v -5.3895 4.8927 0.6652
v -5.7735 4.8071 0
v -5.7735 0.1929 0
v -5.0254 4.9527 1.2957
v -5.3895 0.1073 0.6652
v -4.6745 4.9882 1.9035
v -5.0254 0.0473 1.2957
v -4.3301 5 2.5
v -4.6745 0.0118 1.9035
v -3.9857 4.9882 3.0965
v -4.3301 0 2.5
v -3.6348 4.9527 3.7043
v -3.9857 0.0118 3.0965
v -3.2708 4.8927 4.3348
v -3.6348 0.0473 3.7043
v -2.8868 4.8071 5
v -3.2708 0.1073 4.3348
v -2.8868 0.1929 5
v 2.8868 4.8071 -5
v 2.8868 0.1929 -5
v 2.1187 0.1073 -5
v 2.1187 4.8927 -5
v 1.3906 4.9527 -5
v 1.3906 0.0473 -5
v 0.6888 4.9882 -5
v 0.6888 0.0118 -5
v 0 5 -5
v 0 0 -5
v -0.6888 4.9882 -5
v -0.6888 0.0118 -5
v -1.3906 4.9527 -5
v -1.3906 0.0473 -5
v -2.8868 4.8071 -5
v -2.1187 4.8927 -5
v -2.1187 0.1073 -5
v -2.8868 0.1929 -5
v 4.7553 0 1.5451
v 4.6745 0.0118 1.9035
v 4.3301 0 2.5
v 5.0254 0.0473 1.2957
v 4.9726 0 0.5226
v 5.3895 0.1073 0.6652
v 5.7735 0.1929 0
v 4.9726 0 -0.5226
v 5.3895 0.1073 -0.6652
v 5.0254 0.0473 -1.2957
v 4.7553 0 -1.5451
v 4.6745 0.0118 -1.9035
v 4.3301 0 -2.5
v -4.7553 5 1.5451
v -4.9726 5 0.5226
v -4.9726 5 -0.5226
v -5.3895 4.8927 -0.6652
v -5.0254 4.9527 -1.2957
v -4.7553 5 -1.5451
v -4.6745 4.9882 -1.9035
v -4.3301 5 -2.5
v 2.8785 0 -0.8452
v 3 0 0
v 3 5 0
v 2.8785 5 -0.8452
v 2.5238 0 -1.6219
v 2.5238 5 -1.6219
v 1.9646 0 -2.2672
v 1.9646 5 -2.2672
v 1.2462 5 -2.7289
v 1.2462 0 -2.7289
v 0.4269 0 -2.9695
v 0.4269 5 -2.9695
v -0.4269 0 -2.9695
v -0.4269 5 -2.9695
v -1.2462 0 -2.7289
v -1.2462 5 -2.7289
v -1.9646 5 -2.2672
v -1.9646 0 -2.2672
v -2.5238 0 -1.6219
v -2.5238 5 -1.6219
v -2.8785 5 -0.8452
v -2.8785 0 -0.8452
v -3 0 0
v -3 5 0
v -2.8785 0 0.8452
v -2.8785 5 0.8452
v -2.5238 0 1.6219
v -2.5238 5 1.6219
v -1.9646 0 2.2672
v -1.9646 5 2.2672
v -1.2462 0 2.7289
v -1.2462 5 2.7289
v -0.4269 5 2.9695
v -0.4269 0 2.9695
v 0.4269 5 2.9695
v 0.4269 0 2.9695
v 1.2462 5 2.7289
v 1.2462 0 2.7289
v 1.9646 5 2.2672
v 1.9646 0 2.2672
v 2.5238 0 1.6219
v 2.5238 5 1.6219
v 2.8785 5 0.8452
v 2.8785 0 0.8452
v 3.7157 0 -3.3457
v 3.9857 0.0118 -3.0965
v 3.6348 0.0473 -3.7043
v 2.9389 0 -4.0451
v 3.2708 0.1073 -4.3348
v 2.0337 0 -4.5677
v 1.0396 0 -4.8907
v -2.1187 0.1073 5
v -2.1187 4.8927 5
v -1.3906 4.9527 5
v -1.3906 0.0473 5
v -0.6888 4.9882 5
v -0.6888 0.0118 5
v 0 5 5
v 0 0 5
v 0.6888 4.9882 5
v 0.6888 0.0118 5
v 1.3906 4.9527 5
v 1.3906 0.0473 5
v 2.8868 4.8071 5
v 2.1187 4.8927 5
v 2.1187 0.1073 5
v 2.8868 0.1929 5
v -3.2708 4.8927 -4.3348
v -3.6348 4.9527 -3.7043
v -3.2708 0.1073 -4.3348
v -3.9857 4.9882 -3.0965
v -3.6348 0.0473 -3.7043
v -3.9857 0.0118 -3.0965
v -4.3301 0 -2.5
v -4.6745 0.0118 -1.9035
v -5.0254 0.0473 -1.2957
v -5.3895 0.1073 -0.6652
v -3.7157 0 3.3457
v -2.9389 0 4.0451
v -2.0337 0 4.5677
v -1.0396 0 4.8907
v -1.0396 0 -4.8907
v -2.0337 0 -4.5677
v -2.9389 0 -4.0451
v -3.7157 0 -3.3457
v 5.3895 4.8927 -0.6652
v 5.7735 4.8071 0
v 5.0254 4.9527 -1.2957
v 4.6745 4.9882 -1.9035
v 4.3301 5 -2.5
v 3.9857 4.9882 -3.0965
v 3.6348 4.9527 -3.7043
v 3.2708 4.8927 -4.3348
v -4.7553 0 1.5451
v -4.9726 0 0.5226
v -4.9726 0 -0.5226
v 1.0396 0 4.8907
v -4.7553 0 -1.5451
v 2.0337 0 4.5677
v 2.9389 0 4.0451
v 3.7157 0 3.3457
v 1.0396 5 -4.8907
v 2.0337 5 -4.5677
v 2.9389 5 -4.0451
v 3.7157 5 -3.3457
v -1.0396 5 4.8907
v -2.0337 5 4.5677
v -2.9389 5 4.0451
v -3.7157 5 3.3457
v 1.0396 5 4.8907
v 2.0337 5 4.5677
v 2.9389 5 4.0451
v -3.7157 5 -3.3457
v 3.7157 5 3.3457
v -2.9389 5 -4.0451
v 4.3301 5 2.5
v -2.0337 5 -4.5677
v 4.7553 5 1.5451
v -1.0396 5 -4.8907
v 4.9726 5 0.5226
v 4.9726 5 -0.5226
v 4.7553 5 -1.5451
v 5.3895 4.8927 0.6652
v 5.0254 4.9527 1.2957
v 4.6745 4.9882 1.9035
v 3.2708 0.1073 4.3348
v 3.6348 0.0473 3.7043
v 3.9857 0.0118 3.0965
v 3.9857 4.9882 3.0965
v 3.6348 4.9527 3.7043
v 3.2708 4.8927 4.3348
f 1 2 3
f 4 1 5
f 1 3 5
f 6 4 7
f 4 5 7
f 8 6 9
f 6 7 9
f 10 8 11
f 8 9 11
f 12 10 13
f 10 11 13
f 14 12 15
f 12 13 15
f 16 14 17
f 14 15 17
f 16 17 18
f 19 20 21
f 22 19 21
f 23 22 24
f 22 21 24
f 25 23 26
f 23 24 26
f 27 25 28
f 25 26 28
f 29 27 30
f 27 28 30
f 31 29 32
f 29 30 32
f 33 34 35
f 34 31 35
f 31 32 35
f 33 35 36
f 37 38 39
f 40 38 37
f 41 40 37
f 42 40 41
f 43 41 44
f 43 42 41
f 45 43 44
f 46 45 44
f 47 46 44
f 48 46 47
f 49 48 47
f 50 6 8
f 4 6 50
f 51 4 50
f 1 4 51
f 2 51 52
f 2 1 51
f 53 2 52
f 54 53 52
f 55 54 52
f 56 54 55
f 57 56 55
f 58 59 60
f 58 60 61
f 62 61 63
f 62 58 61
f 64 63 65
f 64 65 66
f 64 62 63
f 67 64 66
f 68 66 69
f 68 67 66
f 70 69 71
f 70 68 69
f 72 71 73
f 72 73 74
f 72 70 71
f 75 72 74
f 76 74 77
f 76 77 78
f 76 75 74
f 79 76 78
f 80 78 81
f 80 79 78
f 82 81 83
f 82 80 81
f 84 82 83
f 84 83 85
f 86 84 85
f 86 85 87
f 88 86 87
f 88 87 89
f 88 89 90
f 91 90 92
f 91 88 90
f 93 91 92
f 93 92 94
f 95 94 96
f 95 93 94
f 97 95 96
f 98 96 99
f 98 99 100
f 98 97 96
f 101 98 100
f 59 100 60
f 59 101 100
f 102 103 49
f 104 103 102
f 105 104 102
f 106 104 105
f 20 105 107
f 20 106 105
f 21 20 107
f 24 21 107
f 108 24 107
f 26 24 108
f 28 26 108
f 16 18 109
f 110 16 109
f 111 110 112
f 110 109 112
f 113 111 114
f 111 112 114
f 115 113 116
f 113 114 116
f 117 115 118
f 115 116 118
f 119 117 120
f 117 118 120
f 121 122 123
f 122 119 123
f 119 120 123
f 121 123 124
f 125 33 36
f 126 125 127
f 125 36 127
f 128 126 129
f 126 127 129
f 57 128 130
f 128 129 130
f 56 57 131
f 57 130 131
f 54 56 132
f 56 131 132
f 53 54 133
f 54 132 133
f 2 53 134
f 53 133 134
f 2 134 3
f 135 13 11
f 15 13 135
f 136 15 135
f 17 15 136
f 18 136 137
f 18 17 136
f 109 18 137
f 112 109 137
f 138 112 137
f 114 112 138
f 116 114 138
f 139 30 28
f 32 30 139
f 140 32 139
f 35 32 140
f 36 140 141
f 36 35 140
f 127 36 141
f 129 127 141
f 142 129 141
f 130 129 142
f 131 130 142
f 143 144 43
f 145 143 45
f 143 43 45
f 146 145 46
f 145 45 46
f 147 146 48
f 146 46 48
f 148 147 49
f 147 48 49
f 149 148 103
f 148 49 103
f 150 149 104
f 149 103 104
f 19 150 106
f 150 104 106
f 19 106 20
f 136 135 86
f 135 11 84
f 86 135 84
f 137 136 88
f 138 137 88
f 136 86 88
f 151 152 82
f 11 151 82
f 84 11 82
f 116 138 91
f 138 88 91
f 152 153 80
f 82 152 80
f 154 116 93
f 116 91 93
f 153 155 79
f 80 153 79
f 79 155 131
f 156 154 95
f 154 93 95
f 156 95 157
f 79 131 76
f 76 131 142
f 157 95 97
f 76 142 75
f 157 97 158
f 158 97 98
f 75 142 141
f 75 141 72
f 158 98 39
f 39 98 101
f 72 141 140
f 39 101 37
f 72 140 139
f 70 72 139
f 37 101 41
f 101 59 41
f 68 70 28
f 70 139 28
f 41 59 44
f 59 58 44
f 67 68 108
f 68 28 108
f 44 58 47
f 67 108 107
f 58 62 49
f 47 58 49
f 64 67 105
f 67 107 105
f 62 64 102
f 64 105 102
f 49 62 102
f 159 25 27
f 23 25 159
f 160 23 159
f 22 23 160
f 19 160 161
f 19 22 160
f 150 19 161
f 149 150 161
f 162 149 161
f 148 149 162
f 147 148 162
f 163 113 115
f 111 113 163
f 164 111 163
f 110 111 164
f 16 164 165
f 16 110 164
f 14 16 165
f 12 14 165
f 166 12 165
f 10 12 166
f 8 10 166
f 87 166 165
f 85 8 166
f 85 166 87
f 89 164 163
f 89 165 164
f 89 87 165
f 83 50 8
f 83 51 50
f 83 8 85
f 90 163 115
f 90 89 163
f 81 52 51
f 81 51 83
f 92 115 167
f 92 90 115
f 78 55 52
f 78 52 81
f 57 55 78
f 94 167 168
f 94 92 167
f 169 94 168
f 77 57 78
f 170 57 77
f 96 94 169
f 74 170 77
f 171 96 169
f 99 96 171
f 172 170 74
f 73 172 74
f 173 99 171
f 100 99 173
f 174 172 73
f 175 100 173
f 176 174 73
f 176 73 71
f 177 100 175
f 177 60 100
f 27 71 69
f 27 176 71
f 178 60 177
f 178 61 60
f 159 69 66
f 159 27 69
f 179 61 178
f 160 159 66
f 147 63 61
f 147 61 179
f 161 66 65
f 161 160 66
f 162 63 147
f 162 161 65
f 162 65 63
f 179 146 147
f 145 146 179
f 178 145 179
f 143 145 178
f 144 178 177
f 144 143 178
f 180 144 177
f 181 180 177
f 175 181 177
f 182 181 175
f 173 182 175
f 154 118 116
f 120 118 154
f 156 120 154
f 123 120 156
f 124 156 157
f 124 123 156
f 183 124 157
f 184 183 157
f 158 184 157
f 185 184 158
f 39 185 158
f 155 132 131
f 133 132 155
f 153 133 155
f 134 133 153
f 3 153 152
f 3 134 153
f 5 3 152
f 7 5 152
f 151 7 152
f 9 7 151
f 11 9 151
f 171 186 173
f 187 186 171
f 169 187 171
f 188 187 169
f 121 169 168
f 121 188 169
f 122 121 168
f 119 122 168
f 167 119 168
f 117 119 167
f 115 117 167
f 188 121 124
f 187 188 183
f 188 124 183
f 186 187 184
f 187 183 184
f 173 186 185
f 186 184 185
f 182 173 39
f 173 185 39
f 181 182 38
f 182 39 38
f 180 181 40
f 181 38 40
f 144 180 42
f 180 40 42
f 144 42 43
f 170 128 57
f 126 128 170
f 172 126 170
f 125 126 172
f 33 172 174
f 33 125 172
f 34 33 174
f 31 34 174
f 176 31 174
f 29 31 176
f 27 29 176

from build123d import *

# Parameters (mm, degrees)
SKETCH1_R           = 3
BOSS_EXTRUDE1_DEPTH = 5
SKETCH2_OUTSIDE_W   = 18.366
SKETCH2_OUTSIDE_H   = 16.818
SKETCH2_OUTSIDE_R   = 5
CUT_EXTRUDE2_DEPTH  = 0.2
CUT_EXTRUDE2_TAPER  = 76
SKETCH3_OUTSIDE_W   = 18.366
SKETCH3_OUTSIDE_H   = 16.818
SKETCH3_OUTSIDE_R   = 5
CUT_EXTRUDE3_DEPTH  = 0.2
CUT_EXTRUDE3_TAPER  = 76


with BuildPart() as part:
    # Sketch1 → Boss-Extrude1 (new body)
    with BuildSketch(Plane(origin=(0, 0, 0), x_dir=(1, 0, 0), z_dir=(0, 1, 0))):
        Polygon((5.773502692, 0), (2.886751346, 5), (-2.886751346, 5), (-5.773502692, 0), (-2.886751346, -5), (2.886751346, -5), align=None)
        Circle(SKETCH1_R, mode=Mode.SUBTRACT)
    extrude(amount=BOSS_EXTRUDE1_DEPTH)

    # Sketch2 outside → Cut-Extrude2 (cut)
    with BuildSketch(Plane(origin=(0, 5, 0), x_dir=(1, 0, 0), z_dir=(0, 1, 0))):
        Rectangle(SKETCH2_OUTSIDE_W, SKETCH2_OUTSIDE_H)
        Circle(SKETCH2_OUTSIDE_R, mode=Mode.SUBTRACT)
    extrude(amount=-CUT_EXTRUDE2_DEPTH, taper=CUT_EXTRUDE2_TAPER, mode=Mode.SUBTRACT)

    # Sketch3 outside → Cut-Extrude3 (cut)
    with BuildSketch(Plane.XZ):
        Rectangle(SKETCH3_OUTSIDE_W, SKETCH3_OUTSIDE_H)
        Circle(SKETCH3_OUTSIDE_R, mode=Mode.SUBTRACT)
    extrude(amount=-CUT_EXTRUDE3_DEPTH, taper=CUT_EXTRUDE3_TAPER, mode=Mode.SUBTRACT)


solid = part.part
